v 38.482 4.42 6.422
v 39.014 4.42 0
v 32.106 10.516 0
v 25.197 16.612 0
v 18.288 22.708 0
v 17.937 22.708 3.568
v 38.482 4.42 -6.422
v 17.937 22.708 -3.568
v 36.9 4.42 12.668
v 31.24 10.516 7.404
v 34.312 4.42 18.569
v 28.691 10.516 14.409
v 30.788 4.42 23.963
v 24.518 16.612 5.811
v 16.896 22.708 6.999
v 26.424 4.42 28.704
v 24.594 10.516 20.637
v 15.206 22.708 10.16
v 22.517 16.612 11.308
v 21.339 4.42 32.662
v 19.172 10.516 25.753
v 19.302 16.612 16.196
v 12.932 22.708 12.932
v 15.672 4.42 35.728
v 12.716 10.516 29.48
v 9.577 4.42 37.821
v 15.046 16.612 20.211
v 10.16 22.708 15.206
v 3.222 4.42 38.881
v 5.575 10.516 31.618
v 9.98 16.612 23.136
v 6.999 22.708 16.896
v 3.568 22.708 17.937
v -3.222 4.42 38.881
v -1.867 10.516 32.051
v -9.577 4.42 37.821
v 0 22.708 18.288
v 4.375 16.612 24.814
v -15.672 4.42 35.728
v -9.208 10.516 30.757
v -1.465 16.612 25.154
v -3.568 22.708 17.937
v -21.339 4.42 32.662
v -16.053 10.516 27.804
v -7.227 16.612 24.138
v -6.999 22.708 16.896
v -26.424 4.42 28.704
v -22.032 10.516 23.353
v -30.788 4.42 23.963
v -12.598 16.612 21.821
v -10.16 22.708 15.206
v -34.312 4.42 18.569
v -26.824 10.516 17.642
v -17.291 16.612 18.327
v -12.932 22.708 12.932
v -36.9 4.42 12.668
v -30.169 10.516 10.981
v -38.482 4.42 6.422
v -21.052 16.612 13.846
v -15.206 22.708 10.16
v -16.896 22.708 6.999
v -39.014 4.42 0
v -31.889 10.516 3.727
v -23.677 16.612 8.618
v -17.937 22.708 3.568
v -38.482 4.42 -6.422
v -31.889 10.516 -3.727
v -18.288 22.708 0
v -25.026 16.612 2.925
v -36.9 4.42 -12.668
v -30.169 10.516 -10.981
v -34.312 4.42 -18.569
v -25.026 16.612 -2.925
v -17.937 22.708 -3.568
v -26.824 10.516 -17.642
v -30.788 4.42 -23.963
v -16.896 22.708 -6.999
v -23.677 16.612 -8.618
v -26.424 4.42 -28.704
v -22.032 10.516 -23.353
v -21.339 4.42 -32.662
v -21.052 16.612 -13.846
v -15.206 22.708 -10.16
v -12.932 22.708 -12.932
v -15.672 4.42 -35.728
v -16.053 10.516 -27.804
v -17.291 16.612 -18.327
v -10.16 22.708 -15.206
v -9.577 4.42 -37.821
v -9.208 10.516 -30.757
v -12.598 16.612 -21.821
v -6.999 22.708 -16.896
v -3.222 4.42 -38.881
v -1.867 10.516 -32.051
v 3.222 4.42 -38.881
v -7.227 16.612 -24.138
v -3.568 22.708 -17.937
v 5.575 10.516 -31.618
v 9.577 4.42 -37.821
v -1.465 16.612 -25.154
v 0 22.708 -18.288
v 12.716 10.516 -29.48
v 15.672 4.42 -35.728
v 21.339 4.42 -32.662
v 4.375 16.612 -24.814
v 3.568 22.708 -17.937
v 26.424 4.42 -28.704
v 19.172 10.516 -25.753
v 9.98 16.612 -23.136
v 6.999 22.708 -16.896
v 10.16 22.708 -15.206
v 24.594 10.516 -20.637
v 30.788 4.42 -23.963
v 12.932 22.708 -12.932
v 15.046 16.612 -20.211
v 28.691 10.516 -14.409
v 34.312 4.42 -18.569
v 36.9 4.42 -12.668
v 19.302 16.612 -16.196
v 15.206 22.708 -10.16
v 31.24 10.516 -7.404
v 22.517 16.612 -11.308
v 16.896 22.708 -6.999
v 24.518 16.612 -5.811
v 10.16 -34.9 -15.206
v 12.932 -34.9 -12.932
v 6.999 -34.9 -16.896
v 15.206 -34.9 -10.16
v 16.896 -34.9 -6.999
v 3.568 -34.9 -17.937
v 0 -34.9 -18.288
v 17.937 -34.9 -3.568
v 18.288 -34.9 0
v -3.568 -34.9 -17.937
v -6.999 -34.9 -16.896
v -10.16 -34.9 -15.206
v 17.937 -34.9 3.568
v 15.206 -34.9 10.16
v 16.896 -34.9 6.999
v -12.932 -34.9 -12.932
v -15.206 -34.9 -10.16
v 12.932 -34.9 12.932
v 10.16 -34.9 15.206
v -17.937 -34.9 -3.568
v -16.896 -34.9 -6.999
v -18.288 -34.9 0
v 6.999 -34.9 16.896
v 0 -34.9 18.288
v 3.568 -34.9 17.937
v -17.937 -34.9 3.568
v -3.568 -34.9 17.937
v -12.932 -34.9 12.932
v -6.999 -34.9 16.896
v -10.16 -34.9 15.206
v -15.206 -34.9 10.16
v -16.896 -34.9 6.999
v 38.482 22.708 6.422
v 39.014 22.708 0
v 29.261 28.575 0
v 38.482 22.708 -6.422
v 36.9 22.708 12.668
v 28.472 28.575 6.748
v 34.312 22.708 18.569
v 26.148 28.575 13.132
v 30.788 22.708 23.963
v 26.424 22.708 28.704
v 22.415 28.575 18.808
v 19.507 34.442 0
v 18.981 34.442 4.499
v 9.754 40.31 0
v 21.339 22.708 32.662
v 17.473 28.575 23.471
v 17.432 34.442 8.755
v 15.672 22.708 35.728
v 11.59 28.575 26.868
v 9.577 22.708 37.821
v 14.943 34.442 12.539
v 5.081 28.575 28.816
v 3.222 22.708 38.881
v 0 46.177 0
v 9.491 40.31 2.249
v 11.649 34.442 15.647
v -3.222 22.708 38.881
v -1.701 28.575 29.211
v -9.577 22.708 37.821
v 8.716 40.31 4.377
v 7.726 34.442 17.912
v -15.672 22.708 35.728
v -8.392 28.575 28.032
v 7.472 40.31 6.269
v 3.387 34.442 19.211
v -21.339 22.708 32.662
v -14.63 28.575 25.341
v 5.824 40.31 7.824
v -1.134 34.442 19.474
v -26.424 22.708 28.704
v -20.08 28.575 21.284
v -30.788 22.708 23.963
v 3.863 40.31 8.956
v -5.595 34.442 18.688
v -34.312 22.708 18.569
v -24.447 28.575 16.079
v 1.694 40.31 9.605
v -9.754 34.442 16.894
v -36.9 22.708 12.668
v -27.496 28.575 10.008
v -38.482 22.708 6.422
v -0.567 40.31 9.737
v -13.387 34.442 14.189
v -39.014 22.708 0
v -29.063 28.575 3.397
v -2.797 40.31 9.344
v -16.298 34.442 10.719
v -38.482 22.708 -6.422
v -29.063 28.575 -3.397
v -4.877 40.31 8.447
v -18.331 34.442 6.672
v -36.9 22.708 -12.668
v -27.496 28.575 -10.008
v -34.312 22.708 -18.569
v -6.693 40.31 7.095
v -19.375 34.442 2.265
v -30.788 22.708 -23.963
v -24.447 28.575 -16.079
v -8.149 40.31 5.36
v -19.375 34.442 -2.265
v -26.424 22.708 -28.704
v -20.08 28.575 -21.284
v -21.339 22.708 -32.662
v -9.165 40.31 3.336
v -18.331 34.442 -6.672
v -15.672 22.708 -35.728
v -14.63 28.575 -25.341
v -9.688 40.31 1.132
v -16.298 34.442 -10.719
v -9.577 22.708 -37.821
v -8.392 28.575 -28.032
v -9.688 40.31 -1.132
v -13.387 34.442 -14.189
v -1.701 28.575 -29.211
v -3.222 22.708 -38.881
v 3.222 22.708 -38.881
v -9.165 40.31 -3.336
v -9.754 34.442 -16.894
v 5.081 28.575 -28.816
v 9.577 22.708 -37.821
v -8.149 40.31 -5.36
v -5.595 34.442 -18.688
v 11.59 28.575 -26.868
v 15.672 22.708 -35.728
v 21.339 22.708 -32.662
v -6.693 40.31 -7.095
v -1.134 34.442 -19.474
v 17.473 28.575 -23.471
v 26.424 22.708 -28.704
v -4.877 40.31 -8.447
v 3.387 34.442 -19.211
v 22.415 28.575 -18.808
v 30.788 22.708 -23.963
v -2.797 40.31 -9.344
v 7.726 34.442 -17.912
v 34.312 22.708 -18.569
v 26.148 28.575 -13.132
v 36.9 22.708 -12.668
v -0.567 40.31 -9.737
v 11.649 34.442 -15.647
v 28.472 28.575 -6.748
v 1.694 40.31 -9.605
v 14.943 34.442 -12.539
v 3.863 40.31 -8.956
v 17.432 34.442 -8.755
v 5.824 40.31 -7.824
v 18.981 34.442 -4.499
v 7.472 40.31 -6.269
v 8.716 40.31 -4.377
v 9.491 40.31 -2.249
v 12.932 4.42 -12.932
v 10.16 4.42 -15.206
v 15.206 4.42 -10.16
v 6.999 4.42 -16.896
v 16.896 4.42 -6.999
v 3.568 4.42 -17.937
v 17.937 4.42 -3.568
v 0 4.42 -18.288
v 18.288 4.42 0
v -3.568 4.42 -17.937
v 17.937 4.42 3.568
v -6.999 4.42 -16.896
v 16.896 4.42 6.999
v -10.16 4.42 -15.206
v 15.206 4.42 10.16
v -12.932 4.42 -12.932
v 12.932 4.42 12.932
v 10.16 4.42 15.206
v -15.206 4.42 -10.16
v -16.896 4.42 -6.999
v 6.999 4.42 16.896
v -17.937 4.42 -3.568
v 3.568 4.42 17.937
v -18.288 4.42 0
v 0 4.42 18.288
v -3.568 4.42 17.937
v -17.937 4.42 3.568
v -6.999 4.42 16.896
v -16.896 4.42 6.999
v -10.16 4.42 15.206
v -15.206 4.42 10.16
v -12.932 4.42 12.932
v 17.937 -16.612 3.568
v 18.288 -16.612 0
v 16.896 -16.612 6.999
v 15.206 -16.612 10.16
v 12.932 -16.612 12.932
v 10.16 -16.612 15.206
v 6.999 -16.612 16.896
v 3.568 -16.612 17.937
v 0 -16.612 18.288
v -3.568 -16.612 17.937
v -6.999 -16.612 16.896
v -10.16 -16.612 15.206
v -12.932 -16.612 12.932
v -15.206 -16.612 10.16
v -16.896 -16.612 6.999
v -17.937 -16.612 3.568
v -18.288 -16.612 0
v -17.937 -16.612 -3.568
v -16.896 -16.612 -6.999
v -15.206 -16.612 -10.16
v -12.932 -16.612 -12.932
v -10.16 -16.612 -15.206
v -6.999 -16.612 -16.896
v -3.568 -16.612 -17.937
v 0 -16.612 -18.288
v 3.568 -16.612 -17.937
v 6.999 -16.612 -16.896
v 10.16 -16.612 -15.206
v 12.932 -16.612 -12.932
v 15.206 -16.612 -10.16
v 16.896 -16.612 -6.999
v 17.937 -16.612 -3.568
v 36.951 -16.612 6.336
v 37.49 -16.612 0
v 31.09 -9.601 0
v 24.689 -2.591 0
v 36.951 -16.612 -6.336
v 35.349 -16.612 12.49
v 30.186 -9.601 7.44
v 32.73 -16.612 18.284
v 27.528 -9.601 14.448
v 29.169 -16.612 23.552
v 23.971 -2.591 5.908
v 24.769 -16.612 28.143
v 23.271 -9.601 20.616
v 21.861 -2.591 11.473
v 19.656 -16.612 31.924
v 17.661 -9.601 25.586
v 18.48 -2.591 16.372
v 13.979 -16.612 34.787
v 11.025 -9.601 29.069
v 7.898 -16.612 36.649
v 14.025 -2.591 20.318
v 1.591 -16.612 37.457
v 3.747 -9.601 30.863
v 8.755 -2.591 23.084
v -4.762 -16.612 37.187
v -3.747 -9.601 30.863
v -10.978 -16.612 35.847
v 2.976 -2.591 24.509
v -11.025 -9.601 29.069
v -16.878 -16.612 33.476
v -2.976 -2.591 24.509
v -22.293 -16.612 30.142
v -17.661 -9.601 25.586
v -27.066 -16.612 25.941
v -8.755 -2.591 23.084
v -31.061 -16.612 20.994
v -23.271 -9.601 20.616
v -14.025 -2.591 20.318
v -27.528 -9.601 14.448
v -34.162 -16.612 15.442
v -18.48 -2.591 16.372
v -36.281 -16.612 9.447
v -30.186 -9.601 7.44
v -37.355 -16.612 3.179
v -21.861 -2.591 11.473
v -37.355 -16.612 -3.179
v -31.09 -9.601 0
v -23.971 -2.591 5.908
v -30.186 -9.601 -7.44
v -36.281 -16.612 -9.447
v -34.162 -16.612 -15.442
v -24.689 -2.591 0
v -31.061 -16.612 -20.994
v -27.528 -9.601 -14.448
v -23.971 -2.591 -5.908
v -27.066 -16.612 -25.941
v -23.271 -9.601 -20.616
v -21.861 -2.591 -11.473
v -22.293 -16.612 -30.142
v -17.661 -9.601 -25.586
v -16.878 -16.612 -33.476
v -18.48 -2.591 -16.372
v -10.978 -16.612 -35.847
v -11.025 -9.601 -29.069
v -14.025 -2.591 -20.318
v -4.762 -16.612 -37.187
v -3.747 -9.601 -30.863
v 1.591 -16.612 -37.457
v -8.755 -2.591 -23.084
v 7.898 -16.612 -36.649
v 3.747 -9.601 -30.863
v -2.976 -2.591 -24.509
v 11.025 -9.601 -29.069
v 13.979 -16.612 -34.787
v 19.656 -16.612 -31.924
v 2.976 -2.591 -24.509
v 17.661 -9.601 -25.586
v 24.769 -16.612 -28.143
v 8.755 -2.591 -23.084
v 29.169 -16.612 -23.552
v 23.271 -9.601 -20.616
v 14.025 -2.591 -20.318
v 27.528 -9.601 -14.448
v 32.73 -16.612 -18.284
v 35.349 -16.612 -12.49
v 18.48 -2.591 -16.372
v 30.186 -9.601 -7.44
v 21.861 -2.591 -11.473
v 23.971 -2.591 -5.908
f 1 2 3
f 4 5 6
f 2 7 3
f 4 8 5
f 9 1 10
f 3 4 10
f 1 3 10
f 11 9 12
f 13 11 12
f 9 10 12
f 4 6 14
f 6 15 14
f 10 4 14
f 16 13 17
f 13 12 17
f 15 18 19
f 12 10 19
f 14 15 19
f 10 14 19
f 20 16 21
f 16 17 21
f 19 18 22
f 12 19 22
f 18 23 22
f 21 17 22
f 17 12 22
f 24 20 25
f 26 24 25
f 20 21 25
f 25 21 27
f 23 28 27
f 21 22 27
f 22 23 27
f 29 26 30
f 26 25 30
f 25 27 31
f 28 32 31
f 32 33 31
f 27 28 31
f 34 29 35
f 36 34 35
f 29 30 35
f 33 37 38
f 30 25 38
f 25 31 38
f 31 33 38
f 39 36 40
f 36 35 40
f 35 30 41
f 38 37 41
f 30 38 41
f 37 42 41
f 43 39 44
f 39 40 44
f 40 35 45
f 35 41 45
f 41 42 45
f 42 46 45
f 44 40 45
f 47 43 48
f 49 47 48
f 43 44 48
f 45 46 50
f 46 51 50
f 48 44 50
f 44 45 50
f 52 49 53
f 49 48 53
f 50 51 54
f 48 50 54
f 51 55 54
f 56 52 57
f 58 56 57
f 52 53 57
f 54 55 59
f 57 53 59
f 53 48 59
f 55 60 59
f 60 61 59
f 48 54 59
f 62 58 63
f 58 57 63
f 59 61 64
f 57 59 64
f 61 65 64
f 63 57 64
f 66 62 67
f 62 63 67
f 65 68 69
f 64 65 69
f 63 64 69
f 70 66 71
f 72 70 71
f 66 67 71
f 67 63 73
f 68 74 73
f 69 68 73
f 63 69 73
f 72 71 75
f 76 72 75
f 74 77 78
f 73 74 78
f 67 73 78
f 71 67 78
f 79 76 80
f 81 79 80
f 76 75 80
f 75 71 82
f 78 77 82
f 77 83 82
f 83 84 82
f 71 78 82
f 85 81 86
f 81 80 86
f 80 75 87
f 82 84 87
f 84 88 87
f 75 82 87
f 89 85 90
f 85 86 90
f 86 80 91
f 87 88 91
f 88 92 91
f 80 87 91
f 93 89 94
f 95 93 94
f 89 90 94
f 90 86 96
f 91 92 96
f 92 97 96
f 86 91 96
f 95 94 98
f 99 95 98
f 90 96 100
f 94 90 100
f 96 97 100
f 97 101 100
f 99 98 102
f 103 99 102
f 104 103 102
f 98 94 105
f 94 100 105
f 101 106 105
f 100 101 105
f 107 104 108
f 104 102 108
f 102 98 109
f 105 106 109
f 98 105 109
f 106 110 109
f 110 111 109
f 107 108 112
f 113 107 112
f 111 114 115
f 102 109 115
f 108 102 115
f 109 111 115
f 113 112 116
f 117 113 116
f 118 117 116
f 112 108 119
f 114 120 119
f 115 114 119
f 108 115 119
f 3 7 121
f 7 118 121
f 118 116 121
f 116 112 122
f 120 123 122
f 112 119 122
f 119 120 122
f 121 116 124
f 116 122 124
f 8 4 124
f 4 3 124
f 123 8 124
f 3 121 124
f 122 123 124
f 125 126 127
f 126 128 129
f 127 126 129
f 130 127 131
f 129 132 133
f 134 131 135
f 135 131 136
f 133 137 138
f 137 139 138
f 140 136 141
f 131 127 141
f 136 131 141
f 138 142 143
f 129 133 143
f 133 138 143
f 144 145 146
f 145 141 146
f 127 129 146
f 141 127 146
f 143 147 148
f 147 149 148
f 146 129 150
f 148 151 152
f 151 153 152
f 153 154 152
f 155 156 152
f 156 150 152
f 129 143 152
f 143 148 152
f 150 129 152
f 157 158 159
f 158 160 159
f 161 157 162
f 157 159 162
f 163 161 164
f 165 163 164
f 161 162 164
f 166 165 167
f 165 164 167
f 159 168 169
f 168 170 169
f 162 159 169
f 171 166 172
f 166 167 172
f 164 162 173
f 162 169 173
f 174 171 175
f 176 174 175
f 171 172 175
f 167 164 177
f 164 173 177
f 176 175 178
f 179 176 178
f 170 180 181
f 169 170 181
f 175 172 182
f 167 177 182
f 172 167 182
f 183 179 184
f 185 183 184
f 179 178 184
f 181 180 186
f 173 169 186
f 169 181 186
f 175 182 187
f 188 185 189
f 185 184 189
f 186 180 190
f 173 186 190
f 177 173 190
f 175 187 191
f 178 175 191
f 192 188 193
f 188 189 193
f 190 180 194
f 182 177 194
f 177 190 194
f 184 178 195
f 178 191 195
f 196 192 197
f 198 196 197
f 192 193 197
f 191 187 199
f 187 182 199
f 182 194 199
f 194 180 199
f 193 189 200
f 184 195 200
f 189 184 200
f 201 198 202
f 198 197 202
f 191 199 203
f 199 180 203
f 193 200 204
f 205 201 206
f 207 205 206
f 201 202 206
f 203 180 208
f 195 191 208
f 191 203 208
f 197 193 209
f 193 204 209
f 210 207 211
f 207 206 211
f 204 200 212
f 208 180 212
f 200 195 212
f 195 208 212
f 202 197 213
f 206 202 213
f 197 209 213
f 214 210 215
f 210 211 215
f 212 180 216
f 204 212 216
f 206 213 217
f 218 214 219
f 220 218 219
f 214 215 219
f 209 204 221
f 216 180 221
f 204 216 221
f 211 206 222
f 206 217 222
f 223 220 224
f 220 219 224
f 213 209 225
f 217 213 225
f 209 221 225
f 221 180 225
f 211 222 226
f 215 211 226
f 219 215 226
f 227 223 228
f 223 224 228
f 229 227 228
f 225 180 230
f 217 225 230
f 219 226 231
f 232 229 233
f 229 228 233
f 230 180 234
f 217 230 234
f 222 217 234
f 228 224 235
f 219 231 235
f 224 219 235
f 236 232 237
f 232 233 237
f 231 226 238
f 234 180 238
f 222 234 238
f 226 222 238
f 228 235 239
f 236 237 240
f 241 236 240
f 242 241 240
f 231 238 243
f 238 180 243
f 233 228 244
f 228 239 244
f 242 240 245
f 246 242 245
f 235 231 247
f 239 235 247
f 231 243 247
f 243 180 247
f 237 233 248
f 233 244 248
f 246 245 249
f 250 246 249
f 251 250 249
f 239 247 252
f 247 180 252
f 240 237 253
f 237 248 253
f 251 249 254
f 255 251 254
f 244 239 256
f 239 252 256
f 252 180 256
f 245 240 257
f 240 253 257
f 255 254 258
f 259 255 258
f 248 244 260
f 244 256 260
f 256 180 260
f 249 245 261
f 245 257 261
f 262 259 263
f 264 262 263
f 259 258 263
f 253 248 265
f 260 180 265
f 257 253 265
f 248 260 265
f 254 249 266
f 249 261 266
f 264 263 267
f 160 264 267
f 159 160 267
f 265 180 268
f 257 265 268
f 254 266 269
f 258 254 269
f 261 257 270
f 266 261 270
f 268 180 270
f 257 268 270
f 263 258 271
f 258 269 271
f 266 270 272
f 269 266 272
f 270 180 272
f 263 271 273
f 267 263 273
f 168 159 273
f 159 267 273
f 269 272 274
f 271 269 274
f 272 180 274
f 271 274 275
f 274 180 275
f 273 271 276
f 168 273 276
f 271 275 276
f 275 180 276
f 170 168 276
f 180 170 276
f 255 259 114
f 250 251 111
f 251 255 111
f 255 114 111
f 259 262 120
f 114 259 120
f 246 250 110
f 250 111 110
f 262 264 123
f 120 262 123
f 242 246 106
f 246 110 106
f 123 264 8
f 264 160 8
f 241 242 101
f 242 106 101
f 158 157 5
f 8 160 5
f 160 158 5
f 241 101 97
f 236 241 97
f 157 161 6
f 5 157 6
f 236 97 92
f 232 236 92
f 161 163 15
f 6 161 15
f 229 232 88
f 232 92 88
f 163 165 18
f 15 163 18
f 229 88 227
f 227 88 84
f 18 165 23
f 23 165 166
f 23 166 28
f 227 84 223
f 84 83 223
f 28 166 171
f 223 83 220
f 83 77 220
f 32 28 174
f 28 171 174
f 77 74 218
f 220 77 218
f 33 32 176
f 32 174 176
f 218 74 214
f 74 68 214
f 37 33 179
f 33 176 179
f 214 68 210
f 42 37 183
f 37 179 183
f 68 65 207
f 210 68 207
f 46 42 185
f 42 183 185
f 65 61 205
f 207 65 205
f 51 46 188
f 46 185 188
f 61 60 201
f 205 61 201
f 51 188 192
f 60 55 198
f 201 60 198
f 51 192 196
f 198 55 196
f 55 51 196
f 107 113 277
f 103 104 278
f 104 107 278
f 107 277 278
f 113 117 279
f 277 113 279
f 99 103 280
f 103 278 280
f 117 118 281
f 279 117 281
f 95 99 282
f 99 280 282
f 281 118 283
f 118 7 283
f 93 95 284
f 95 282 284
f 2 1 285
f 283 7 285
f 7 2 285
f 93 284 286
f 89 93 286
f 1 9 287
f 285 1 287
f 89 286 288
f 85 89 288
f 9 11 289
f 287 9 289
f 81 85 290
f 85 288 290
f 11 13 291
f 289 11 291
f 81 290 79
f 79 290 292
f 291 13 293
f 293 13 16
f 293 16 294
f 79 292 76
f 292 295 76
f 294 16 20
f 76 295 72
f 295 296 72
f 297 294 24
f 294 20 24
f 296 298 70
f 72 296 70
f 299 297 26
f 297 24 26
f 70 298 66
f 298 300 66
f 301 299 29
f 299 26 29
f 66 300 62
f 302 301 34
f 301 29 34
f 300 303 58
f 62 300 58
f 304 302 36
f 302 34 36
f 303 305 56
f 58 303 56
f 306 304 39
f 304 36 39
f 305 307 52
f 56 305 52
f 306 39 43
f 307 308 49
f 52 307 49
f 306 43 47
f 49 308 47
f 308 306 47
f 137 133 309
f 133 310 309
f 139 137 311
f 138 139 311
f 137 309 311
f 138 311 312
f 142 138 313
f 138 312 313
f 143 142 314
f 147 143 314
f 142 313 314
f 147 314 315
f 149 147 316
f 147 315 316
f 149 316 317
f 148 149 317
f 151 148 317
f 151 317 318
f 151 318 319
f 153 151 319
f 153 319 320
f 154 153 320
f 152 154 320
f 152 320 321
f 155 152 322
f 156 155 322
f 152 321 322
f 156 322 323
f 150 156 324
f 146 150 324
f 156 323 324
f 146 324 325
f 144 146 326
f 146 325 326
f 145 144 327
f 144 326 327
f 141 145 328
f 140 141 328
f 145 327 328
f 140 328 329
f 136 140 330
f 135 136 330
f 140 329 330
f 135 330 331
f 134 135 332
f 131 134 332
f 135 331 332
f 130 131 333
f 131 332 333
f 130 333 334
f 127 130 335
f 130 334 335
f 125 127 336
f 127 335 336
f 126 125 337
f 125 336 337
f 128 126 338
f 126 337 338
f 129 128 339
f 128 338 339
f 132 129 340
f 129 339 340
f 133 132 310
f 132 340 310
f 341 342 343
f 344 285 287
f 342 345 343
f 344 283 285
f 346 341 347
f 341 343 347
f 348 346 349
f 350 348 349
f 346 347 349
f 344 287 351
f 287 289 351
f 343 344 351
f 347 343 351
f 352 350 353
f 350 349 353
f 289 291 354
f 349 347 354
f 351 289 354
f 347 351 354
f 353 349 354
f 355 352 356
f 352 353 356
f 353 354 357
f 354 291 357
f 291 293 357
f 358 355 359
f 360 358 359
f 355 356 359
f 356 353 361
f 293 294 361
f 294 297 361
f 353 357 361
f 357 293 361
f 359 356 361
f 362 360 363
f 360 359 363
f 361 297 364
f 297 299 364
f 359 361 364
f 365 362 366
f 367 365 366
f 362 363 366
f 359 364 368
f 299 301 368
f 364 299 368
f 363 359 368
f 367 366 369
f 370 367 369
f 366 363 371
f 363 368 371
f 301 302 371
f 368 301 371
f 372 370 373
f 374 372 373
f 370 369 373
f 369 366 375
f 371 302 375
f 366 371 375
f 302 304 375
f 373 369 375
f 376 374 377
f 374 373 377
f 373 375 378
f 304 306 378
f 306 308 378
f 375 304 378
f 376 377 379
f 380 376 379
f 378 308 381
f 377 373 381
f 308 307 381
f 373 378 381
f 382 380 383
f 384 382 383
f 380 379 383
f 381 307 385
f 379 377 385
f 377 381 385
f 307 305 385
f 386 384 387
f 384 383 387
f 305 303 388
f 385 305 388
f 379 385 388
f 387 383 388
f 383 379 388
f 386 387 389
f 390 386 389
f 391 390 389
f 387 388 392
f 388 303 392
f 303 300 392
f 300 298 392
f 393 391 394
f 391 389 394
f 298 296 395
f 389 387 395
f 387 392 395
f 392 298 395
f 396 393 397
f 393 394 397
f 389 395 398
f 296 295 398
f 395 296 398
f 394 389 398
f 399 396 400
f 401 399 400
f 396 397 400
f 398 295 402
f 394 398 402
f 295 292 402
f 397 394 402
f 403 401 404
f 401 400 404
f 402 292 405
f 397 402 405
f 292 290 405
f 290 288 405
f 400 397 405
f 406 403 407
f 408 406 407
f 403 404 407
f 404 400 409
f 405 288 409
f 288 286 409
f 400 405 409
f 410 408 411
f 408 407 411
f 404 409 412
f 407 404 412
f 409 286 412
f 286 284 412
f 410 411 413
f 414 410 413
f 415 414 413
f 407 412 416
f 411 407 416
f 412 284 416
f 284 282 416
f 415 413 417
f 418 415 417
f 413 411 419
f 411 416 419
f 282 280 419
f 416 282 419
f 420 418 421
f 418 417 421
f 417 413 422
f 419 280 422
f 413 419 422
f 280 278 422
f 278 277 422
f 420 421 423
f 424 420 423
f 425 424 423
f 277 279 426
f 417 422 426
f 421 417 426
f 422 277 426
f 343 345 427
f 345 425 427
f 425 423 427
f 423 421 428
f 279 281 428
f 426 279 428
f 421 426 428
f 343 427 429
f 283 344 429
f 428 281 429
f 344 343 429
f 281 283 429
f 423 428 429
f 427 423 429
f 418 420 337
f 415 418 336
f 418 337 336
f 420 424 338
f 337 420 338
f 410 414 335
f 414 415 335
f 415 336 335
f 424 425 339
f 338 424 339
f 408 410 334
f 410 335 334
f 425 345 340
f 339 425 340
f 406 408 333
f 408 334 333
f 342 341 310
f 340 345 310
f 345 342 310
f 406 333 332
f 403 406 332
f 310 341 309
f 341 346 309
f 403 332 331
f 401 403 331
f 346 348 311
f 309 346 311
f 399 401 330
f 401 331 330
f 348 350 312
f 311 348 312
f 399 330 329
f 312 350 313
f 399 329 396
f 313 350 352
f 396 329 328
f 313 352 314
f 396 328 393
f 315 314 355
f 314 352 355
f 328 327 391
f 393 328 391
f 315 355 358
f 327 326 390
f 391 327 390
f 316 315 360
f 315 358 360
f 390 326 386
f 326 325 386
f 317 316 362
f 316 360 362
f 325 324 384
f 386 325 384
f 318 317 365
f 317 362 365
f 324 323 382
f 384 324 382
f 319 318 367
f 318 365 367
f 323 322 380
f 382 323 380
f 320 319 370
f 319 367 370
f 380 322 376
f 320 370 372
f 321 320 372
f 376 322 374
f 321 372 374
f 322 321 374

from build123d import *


with BuildPart() as f1:
    # F0 (on Top) → F1 (revolve)
    with BuildSketch(Plane.XY):
        Polygon((39.014403, 22.7076), (0, 46.177197), (0, -34.8996), (18.288001, -34.8996), (18.288001, -16.6116), (37.490401, -16.6116), (18.288001, 4.4196), (39.014403, 4.4196), (18.288001, 22.7076), align=None)
    revolve(axis=Axis((0, 2.743199, 0), (0, -1, 0)))


solid = f1.part
